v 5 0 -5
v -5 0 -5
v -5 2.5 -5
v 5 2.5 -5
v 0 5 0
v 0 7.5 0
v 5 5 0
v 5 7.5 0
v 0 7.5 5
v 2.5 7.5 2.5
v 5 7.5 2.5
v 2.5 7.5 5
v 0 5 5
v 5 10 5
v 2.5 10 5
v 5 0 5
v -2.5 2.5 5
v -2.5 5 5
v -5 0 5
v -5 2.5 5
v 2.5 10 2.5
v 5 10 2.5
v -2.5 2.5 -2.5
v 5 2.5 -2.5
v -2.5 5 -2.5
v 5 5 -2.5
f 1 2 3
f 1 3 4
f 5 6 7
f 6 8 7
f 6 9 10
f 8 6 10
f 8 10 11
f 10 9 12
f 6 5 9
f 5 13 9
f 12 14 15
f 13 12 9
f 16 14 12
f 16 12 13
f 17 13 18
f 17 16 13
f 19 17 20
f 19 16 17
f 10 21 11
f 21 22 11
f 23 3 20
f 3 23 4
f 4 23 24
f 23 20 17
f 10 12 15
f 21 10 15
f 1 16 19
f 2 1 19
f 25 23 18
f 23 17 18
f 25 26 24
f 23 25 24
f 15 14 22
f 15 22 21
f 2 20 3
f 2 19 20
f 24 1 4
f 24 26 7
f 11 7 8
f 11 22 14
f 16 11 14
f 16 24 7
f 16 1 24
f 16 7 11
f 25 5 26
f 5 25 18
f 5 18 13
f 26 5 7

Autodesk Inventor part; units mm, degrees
ref_plane "YZ Plane" through (0, 0, 0) normal (1, 0, 0) x (0, 1, 0)
ref_plane "XZ Plane" through (0, 0, 0) normal (0, 1, 0) x (-1, 0, 0)
ref_plane "XY Plane" through (0, 0, 0) normal (0, 0, 1) x (1, 0, 0)
sketch "Sketch1" plane through (0, 0, 0) normal (0, 1, 0) x (-1, 0, 0)
  line L0 (-5, 5) -> (5, 5)
  line L1 (5, 5) -> (5, -5)
  line L2 (5, -5) -> (-5, -5)
  line L3 (-5, -5) -> (-5, 5)
  line L4 (-5, 5) -> (5, -5) construction
  line L5 (5, 5) -> (-5, -5) construction
  point P0 (0, 0)
  dimension "d0" = 10
  dimension "d1" = 10
extrude "Extrusion1" add sketch "Sketch1" along normal blind 10
sketch "Sketch2" plane through (5, 0, 5) normal (1, 0, 0) x (0, 0, -1)
  line L0 (10, 10) -> (7.5, 10)
  line L1 (7.5, 10) -> (7.5, 2.5)
  line L2 (7.5, 2.5) -> (10, 2.5)
  line L3 (10, 2.5) -> (10, 10)
  point P0 (5, 0)
  dimension "d4" = 2.5
  dimension "d5" = 7.5
extrude "Extrusion2" cut sketch "Sketch2" against normal blind 10
sketch "Sketch3" plane through (5, 0, 5) normal (1, 0, 0) x (0, 0, -1)
  line L0 (7.5, 10) -> (5, 10)
  line L1 (5, 10) -> (5, 5)
  line L2 (5, 5) -> (7.5, 5)
  line L3 (7.5, 5) -> (7.5, 10)
  point P0 (5, 0)
  dimension "d8" = 2.5
  dimension "d9" = 5
extrude "Extrusion3" cut sketch "Sketch3" against normal blind 10
sketch "Sketch4" plane through (5, 0, 5) normal (1, 0, 0) x (0, 0, -1)
  line L0 (5, 10) -> (2.5, 10)
  line L1 (2.5, 10) -> (2.5, 7.5)
  line L2 (2.5, 7.5) -> (5, 7.5)
  line L3 (5, 7.5) -> (5, 10)
  point P0 (5, 0)
  dimension "d12" = 2.5
  dimension "d13" = 2.5
extrude "Extrusion4" cut sketch "Sketch4" against normal blind 10
sketch "Sketch5" plane through (-5, 0, 5) normal (0, 0, 1) x (1, 0, 0)
  line L0 (0, 10) -> (10, 10) projected
  line L1 (0, 0) -> (0, 10) projected
  line L2 (0, 10) -> (0, 2.5)
  line L3 (0, 2.5) -> (2.5, 2.5)
  line L4 (2.5, 2.5) -> (2.5, 5)
  line L5 (2.5, 5) -> (5, 5)
  line L6 (5, 5) -> (5, 7.5)
  line L7 (5, 7.5) -> (7.5, 7.5)
  line L8 (7.5, 7.5) -> (7.5, 10)
  point P0 (5, 0)
  dimension "d16" = 7.5
  dimension "d17" = 2.5
  dimension "d18" = 2.5
  dimension "d19" = 90
  dimension "d20" = 2.5
  dimension "d21" = 90
  dimension "d22" = 2.5
  dimension "d23" = 90
  dimension "d24" = 2.5
  dimension "d25" = 90
extrude "Extrusion5" cut sketch "Sketch5" against normal blind 10
properties part number "157"
